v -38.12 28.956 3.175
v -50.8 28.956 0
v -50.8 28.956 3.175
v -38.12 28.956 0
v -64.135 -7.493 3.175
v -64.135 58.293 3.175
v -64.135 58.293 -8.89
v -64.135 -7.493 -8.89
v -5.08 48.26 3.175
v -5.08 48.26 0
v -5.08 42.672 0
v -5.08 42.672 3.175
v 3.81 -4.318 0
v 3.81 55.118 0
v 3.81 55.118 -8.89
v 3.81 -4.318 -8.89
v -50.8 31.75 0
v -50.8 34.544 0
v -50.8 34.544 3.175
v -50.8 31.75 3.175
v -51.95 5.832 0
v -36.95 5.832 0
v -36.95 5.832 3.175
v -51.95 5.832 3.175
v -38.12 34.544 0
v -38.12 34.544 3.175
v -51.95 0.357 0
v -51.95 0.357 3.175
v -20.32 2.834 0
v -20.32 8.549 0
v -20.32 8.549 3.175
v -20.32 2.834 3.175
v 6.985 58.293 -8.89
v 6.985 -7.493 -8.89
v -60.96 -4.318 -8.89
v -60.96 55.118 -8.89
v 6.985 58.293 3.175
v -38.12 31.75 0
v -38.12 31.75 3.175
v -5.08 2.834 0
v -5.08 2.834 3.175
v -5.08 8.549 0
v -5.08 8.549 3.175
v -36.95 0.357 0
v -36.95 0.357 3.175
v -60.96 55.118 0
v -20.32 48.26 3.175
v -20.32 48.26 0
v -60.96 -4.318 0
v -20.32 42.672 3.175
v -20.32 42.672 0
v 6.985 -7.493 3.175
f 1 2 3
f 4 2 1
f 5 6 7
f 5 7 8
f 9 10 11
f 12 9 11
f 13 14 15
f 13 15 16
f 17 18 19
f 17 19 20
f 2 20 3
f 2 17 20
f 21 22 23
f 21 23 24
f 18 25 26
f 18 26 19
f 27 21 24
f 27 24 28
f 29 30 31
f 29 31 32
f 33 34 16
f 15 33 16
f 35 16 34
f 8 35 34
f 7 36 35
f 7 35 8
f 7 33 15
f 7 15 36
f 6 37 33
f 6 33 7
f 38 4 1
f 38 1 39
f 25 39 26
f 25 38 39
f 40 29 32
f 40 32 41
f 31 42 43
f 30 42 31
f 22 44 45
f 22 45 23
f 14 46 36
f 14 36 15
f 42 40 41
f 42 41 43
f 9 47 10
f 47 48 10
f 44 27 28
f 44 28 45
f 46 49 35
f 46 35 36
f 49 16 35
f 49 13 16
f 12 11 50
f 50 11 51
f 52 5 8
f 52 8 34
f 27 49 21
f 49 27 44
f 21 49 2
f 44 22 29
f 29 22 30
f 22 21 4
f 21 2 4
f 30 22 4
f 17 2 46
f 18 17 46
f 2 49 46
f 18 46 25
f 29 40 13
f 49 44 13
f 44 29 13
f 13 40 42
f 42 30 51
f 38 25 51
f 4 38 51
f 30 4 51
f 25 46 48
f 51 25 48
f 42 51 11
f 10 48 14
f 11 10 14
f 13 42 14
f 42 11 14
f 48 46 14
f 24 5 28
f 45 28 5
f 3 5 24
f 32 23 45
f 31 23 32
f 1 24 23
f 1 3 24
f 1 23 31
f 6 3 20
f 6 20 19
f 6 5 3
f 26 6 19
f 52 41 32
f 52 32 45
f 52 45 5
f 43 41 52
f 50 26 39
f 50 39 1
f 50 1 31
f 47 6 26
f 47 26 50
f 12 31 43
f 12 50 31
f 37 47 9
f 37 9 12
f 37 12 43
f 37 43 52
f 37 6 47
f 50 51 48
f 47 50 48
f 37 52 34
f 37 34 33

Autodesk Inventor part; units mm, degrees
ref_plane "YZ Plane" through (0, 0, 0) normal (1, 0, 0) x (0, 1, 0)
ref_plane "XZ Plane" through (0, 0, 0) normal (0, 1, 0) x (-1, 0, 0)
ref_plane "XY Plane" through (0, 0, 0) normal (0, 0, 1) x (1, 0, 0)
sketch "Sketch1" plane through (0, 0, 0) normal (0, 0, 1) x (1, 0, 0)
  point P0 (0, 0)
sketch "0" plane through (0, 0, 0) normal (0, 0, 1) x (1, 0, 0)
  line L0 (-20.32, 48.26) -> (-5.08, 48.26)
  line L1 (-5.08, 48.26) -> (-5.08, 42.672)
  line L2 (-5.08, 42.672) -> (-20.32, 42.672)
  line L3 (-20.32, 42.672) -> (-20.32, 48.26)
  line L4 (-36.95, -0.635) -> (-36.95, 4.953)
  line L5 (-36.95, 4.953) -> (-51.95, 4.953)
  line L6 (-51.95, 4.953) -> (-51.95, -0.635)
  line L7 (-51.95, -0.635) -> (-36.95, -0.635)
  line L8 (-20.32, -0.635) -> (-5.08, -0.635)
  line L9 (-5.08, -0.635) -> (-5.08, 4.953)
  line L10 (-5.08, 4.953) -> (-20.32, 4.953)
  line L11 (-20.32, 4.953) -> (-20.32, -0.635)
  line L12 (-60.96, 54.61) -> (-60.96, -3.81)
  line L13 (-60.96, -3.81) -> (3.81, -3.81)
  line L14 (3.81, -3.81) -> (3.81, 54.61)
  line L15 (3.81, 54.61) -> (-60.96, 54.61)
  line L16 (-60.96, -3.81) -> (3.81, -3.81)
  line L17 (3.81, -3.81) -> (3.81, 54.61)
  line L18 (-60.96, 54.61) -> (-60.96, -3.81)
  line L19 (-60.96, -3.81) -> (3.81, -3.81)
  line L20 (-50.8, 28.956) -> (-38.12, 28.956)
  line L21 (-38.12, 28.956) -> (-38.12, 34.544)
  line L22 (-38.12, 34.544) -> (-50.8, 34.544)
  line L23 (-50.8, 34.544) -> (-50.8, 28.956)
  line L24 (-44.45, 31.75) -> (-50.8, 31.75)
  line L25 (-50.8, 31.75) -> (-50.8, 28.956)
  line L26 (-50.8, 28.956) -> (-44.45, 28.956)
  line L27 (-44.45, 28.956) -> (-44.45, 31.75)
  line L28 (-20.32, 0.3568) -> (-36.95, 0.3568)
  line L29 (-50.8, 54.61) -> (-60.96, 54.61)
  line L30 (-5.08, -3.81) -> (3.81, -3.81)
  line L31 (3.81, -3.81) -> (3.81, 54.61)
  circle A0 centre (-54.61, 31.75) radius 1.0922
  circle A1 centre (-34.29, 31.75) radius 1.0922
  line L32 (-54.61, 31.75) -> (-34.29, 31.75)
  line L33 (3.81, 55.118) -> (-60.96, 55.118)
  line L34 (-60.96, -4.318) -> (3.81, -4.318)
  line L35 (-60.96, 55.118) -> (3.81, 55.118)
  line L36 (3.81, 55.118) -> (3.81, -4.318)
  line L37 (3.81, -4.318) -> (-60.96, -4.318)
  line L38 (-60.96, -4.318) -> (-60.96, 55.118)
  line L39 (-60.96, 58.293) -> (6.985, 58.293)
  line L40 (6.985, 58.293) -> (6.985, -4.318)
  line L41 (-64.135, 55.118) -> (-64.135, -7.493)
  line L42 (-64.135, -7.493) -> (3.81, -7.493)
  line L43 (-64.135, 55.118) -> (-60.96, 55.118)
  line L44 (-60.96, 55.118) -> (-60.96, 58.293)
  line L45 (-60.96, 58.293) -> (-64.135, 58.293)
  line L46 (-64.135, 58.293) -> (-64.135, 55.118)
  line L47 (6.985, -4.318) -> (3.81, -4.318)
  line L48 (3.81, -4.318) -> (3.81, -7.493)
  line L49 (3.81, -7.493) -> (6.985, -7.493)
  line L50 (6.985, -7.493) -> (6.985, -4.318)
  line L51 (-20.32, 2.8338) -> (-5.08, 2.8338)
  line L52 (-5.08, 2.8338) -> (-5.08, 8.5488)
  line L53 (-5.08, 8.5488) -> (-20.32, 8.5488)
  line L54 (-20.32, 8.5488) -> (-20.32, 2.8338)
  line L55 (-51.95, 0.3568) -> (-36.95, 0.3568)
  line L56 (-36.95, 0.3568) -> (-36.95, 5.832)
  line L57 (-36.95, 5.832) -> (-51.95, 5.832)
  line L58 (-51.95, 5.832) -> (-51.95, 0.3568)
  point P0 (-20.32, 51.435)
  point P1 (-5.08, 48.26)
  point P2 (-5.08, 42.672)
  point P3 (-20.32, 45.847)
  dimension "d0" = 0.508
  dimension "d1" = 0.508
  dimension "d2" = 3.175
  dimension "d3" = 3.175
  dimension "d9" = 15.24
  dimension "d10" = 5.588
  dimension "d11" = 90
  dimension "d13" = 5.588
  dimension "d14" = 5.588
  dimension "d15" = 15.24
  dimension "d16" = 15.24
  dimension "d17" = 6.35
  dimension "d18" = 5.715
extrude "Extrusion1" add sketch "0" along normal blind 3.175 contours L7 L6 L55 L4 | L11 L51 L9 L8 | L15 L14 L13 L12 | L38 L33 L36 L15 | L12 L38 L34 L48 L42 L41 L43 | L13 L36 L34 L38 | L44 L39 L40 L47 L36 L14 L33 | L43 L46 L45 L44 | L47 L50 L49 L48 | A0 | A1
sketch "Sketch3" plane through (0, 0, 0) normal (0, 0, -1) x (-1, 0, 0)
  line L0 (-6.985, -7.493) -> (-6.985, 58.293) projected
  line L1 (64.135, -7.493) -> (-6.985, -7.493) projected
  line L2 (64.135, 58.293) -> (64.135, -7.493) projected
  line L3 (-6.985, 58.293) -> (64.135, 58.293) projected
  line L4 (36.95, 5.832) -> (36.95, 0.3568) projected
  line L5 (51.95, 0.3568) -> (51.95, 5.832) projected
  line L6 (50.8, 28.956) -> (50.8, 34.544) projected
  line L7 (38.12, 28.956) -> (50.8, 28.956) projected
  line L8 (38.12, 34.544) -> (38.12, 28.956) projected
  line L9 (50.8, 34.544) -> (38.12, 34.544) projected
  line L10 (20.32, 2.8338) -> (20.32, 8.5488) projected
  line L11 (5.08, 8.5488) -> (5.08, 2.8338) projected
  line L12 (-3.81, 55.118) -> (-3.81, -4.318)
  line L13 (-3.81, -4.318) -> (60.96, -4.318)
  line L14 (60.96, -4.318) -> (60.96, 55.118)
  line L15 (60.96, 55.118) -> (-3.81, 55.118)
  line L16 (5.08, 2.8338) -> (20.32, 2.8338) projected
  line L17 (20.32, 8.5488) -> (5.08, 8.5488) projected
  line L18 (36.95, 0.3568) -> (51.95, 0.3568) projected
  line L19 (51.95, 5.832) -> (36.95, 5.832) projected
  point P0 (0, 0)
  dimension "d6" = 3.175
extrude "Extrusion2" add sketch "Sketch3" along normal blind 8.89 contours L0 L3 L2 L1
properties part number "pololuAndRelayCaseTop" material "Rubber, Silicone"
